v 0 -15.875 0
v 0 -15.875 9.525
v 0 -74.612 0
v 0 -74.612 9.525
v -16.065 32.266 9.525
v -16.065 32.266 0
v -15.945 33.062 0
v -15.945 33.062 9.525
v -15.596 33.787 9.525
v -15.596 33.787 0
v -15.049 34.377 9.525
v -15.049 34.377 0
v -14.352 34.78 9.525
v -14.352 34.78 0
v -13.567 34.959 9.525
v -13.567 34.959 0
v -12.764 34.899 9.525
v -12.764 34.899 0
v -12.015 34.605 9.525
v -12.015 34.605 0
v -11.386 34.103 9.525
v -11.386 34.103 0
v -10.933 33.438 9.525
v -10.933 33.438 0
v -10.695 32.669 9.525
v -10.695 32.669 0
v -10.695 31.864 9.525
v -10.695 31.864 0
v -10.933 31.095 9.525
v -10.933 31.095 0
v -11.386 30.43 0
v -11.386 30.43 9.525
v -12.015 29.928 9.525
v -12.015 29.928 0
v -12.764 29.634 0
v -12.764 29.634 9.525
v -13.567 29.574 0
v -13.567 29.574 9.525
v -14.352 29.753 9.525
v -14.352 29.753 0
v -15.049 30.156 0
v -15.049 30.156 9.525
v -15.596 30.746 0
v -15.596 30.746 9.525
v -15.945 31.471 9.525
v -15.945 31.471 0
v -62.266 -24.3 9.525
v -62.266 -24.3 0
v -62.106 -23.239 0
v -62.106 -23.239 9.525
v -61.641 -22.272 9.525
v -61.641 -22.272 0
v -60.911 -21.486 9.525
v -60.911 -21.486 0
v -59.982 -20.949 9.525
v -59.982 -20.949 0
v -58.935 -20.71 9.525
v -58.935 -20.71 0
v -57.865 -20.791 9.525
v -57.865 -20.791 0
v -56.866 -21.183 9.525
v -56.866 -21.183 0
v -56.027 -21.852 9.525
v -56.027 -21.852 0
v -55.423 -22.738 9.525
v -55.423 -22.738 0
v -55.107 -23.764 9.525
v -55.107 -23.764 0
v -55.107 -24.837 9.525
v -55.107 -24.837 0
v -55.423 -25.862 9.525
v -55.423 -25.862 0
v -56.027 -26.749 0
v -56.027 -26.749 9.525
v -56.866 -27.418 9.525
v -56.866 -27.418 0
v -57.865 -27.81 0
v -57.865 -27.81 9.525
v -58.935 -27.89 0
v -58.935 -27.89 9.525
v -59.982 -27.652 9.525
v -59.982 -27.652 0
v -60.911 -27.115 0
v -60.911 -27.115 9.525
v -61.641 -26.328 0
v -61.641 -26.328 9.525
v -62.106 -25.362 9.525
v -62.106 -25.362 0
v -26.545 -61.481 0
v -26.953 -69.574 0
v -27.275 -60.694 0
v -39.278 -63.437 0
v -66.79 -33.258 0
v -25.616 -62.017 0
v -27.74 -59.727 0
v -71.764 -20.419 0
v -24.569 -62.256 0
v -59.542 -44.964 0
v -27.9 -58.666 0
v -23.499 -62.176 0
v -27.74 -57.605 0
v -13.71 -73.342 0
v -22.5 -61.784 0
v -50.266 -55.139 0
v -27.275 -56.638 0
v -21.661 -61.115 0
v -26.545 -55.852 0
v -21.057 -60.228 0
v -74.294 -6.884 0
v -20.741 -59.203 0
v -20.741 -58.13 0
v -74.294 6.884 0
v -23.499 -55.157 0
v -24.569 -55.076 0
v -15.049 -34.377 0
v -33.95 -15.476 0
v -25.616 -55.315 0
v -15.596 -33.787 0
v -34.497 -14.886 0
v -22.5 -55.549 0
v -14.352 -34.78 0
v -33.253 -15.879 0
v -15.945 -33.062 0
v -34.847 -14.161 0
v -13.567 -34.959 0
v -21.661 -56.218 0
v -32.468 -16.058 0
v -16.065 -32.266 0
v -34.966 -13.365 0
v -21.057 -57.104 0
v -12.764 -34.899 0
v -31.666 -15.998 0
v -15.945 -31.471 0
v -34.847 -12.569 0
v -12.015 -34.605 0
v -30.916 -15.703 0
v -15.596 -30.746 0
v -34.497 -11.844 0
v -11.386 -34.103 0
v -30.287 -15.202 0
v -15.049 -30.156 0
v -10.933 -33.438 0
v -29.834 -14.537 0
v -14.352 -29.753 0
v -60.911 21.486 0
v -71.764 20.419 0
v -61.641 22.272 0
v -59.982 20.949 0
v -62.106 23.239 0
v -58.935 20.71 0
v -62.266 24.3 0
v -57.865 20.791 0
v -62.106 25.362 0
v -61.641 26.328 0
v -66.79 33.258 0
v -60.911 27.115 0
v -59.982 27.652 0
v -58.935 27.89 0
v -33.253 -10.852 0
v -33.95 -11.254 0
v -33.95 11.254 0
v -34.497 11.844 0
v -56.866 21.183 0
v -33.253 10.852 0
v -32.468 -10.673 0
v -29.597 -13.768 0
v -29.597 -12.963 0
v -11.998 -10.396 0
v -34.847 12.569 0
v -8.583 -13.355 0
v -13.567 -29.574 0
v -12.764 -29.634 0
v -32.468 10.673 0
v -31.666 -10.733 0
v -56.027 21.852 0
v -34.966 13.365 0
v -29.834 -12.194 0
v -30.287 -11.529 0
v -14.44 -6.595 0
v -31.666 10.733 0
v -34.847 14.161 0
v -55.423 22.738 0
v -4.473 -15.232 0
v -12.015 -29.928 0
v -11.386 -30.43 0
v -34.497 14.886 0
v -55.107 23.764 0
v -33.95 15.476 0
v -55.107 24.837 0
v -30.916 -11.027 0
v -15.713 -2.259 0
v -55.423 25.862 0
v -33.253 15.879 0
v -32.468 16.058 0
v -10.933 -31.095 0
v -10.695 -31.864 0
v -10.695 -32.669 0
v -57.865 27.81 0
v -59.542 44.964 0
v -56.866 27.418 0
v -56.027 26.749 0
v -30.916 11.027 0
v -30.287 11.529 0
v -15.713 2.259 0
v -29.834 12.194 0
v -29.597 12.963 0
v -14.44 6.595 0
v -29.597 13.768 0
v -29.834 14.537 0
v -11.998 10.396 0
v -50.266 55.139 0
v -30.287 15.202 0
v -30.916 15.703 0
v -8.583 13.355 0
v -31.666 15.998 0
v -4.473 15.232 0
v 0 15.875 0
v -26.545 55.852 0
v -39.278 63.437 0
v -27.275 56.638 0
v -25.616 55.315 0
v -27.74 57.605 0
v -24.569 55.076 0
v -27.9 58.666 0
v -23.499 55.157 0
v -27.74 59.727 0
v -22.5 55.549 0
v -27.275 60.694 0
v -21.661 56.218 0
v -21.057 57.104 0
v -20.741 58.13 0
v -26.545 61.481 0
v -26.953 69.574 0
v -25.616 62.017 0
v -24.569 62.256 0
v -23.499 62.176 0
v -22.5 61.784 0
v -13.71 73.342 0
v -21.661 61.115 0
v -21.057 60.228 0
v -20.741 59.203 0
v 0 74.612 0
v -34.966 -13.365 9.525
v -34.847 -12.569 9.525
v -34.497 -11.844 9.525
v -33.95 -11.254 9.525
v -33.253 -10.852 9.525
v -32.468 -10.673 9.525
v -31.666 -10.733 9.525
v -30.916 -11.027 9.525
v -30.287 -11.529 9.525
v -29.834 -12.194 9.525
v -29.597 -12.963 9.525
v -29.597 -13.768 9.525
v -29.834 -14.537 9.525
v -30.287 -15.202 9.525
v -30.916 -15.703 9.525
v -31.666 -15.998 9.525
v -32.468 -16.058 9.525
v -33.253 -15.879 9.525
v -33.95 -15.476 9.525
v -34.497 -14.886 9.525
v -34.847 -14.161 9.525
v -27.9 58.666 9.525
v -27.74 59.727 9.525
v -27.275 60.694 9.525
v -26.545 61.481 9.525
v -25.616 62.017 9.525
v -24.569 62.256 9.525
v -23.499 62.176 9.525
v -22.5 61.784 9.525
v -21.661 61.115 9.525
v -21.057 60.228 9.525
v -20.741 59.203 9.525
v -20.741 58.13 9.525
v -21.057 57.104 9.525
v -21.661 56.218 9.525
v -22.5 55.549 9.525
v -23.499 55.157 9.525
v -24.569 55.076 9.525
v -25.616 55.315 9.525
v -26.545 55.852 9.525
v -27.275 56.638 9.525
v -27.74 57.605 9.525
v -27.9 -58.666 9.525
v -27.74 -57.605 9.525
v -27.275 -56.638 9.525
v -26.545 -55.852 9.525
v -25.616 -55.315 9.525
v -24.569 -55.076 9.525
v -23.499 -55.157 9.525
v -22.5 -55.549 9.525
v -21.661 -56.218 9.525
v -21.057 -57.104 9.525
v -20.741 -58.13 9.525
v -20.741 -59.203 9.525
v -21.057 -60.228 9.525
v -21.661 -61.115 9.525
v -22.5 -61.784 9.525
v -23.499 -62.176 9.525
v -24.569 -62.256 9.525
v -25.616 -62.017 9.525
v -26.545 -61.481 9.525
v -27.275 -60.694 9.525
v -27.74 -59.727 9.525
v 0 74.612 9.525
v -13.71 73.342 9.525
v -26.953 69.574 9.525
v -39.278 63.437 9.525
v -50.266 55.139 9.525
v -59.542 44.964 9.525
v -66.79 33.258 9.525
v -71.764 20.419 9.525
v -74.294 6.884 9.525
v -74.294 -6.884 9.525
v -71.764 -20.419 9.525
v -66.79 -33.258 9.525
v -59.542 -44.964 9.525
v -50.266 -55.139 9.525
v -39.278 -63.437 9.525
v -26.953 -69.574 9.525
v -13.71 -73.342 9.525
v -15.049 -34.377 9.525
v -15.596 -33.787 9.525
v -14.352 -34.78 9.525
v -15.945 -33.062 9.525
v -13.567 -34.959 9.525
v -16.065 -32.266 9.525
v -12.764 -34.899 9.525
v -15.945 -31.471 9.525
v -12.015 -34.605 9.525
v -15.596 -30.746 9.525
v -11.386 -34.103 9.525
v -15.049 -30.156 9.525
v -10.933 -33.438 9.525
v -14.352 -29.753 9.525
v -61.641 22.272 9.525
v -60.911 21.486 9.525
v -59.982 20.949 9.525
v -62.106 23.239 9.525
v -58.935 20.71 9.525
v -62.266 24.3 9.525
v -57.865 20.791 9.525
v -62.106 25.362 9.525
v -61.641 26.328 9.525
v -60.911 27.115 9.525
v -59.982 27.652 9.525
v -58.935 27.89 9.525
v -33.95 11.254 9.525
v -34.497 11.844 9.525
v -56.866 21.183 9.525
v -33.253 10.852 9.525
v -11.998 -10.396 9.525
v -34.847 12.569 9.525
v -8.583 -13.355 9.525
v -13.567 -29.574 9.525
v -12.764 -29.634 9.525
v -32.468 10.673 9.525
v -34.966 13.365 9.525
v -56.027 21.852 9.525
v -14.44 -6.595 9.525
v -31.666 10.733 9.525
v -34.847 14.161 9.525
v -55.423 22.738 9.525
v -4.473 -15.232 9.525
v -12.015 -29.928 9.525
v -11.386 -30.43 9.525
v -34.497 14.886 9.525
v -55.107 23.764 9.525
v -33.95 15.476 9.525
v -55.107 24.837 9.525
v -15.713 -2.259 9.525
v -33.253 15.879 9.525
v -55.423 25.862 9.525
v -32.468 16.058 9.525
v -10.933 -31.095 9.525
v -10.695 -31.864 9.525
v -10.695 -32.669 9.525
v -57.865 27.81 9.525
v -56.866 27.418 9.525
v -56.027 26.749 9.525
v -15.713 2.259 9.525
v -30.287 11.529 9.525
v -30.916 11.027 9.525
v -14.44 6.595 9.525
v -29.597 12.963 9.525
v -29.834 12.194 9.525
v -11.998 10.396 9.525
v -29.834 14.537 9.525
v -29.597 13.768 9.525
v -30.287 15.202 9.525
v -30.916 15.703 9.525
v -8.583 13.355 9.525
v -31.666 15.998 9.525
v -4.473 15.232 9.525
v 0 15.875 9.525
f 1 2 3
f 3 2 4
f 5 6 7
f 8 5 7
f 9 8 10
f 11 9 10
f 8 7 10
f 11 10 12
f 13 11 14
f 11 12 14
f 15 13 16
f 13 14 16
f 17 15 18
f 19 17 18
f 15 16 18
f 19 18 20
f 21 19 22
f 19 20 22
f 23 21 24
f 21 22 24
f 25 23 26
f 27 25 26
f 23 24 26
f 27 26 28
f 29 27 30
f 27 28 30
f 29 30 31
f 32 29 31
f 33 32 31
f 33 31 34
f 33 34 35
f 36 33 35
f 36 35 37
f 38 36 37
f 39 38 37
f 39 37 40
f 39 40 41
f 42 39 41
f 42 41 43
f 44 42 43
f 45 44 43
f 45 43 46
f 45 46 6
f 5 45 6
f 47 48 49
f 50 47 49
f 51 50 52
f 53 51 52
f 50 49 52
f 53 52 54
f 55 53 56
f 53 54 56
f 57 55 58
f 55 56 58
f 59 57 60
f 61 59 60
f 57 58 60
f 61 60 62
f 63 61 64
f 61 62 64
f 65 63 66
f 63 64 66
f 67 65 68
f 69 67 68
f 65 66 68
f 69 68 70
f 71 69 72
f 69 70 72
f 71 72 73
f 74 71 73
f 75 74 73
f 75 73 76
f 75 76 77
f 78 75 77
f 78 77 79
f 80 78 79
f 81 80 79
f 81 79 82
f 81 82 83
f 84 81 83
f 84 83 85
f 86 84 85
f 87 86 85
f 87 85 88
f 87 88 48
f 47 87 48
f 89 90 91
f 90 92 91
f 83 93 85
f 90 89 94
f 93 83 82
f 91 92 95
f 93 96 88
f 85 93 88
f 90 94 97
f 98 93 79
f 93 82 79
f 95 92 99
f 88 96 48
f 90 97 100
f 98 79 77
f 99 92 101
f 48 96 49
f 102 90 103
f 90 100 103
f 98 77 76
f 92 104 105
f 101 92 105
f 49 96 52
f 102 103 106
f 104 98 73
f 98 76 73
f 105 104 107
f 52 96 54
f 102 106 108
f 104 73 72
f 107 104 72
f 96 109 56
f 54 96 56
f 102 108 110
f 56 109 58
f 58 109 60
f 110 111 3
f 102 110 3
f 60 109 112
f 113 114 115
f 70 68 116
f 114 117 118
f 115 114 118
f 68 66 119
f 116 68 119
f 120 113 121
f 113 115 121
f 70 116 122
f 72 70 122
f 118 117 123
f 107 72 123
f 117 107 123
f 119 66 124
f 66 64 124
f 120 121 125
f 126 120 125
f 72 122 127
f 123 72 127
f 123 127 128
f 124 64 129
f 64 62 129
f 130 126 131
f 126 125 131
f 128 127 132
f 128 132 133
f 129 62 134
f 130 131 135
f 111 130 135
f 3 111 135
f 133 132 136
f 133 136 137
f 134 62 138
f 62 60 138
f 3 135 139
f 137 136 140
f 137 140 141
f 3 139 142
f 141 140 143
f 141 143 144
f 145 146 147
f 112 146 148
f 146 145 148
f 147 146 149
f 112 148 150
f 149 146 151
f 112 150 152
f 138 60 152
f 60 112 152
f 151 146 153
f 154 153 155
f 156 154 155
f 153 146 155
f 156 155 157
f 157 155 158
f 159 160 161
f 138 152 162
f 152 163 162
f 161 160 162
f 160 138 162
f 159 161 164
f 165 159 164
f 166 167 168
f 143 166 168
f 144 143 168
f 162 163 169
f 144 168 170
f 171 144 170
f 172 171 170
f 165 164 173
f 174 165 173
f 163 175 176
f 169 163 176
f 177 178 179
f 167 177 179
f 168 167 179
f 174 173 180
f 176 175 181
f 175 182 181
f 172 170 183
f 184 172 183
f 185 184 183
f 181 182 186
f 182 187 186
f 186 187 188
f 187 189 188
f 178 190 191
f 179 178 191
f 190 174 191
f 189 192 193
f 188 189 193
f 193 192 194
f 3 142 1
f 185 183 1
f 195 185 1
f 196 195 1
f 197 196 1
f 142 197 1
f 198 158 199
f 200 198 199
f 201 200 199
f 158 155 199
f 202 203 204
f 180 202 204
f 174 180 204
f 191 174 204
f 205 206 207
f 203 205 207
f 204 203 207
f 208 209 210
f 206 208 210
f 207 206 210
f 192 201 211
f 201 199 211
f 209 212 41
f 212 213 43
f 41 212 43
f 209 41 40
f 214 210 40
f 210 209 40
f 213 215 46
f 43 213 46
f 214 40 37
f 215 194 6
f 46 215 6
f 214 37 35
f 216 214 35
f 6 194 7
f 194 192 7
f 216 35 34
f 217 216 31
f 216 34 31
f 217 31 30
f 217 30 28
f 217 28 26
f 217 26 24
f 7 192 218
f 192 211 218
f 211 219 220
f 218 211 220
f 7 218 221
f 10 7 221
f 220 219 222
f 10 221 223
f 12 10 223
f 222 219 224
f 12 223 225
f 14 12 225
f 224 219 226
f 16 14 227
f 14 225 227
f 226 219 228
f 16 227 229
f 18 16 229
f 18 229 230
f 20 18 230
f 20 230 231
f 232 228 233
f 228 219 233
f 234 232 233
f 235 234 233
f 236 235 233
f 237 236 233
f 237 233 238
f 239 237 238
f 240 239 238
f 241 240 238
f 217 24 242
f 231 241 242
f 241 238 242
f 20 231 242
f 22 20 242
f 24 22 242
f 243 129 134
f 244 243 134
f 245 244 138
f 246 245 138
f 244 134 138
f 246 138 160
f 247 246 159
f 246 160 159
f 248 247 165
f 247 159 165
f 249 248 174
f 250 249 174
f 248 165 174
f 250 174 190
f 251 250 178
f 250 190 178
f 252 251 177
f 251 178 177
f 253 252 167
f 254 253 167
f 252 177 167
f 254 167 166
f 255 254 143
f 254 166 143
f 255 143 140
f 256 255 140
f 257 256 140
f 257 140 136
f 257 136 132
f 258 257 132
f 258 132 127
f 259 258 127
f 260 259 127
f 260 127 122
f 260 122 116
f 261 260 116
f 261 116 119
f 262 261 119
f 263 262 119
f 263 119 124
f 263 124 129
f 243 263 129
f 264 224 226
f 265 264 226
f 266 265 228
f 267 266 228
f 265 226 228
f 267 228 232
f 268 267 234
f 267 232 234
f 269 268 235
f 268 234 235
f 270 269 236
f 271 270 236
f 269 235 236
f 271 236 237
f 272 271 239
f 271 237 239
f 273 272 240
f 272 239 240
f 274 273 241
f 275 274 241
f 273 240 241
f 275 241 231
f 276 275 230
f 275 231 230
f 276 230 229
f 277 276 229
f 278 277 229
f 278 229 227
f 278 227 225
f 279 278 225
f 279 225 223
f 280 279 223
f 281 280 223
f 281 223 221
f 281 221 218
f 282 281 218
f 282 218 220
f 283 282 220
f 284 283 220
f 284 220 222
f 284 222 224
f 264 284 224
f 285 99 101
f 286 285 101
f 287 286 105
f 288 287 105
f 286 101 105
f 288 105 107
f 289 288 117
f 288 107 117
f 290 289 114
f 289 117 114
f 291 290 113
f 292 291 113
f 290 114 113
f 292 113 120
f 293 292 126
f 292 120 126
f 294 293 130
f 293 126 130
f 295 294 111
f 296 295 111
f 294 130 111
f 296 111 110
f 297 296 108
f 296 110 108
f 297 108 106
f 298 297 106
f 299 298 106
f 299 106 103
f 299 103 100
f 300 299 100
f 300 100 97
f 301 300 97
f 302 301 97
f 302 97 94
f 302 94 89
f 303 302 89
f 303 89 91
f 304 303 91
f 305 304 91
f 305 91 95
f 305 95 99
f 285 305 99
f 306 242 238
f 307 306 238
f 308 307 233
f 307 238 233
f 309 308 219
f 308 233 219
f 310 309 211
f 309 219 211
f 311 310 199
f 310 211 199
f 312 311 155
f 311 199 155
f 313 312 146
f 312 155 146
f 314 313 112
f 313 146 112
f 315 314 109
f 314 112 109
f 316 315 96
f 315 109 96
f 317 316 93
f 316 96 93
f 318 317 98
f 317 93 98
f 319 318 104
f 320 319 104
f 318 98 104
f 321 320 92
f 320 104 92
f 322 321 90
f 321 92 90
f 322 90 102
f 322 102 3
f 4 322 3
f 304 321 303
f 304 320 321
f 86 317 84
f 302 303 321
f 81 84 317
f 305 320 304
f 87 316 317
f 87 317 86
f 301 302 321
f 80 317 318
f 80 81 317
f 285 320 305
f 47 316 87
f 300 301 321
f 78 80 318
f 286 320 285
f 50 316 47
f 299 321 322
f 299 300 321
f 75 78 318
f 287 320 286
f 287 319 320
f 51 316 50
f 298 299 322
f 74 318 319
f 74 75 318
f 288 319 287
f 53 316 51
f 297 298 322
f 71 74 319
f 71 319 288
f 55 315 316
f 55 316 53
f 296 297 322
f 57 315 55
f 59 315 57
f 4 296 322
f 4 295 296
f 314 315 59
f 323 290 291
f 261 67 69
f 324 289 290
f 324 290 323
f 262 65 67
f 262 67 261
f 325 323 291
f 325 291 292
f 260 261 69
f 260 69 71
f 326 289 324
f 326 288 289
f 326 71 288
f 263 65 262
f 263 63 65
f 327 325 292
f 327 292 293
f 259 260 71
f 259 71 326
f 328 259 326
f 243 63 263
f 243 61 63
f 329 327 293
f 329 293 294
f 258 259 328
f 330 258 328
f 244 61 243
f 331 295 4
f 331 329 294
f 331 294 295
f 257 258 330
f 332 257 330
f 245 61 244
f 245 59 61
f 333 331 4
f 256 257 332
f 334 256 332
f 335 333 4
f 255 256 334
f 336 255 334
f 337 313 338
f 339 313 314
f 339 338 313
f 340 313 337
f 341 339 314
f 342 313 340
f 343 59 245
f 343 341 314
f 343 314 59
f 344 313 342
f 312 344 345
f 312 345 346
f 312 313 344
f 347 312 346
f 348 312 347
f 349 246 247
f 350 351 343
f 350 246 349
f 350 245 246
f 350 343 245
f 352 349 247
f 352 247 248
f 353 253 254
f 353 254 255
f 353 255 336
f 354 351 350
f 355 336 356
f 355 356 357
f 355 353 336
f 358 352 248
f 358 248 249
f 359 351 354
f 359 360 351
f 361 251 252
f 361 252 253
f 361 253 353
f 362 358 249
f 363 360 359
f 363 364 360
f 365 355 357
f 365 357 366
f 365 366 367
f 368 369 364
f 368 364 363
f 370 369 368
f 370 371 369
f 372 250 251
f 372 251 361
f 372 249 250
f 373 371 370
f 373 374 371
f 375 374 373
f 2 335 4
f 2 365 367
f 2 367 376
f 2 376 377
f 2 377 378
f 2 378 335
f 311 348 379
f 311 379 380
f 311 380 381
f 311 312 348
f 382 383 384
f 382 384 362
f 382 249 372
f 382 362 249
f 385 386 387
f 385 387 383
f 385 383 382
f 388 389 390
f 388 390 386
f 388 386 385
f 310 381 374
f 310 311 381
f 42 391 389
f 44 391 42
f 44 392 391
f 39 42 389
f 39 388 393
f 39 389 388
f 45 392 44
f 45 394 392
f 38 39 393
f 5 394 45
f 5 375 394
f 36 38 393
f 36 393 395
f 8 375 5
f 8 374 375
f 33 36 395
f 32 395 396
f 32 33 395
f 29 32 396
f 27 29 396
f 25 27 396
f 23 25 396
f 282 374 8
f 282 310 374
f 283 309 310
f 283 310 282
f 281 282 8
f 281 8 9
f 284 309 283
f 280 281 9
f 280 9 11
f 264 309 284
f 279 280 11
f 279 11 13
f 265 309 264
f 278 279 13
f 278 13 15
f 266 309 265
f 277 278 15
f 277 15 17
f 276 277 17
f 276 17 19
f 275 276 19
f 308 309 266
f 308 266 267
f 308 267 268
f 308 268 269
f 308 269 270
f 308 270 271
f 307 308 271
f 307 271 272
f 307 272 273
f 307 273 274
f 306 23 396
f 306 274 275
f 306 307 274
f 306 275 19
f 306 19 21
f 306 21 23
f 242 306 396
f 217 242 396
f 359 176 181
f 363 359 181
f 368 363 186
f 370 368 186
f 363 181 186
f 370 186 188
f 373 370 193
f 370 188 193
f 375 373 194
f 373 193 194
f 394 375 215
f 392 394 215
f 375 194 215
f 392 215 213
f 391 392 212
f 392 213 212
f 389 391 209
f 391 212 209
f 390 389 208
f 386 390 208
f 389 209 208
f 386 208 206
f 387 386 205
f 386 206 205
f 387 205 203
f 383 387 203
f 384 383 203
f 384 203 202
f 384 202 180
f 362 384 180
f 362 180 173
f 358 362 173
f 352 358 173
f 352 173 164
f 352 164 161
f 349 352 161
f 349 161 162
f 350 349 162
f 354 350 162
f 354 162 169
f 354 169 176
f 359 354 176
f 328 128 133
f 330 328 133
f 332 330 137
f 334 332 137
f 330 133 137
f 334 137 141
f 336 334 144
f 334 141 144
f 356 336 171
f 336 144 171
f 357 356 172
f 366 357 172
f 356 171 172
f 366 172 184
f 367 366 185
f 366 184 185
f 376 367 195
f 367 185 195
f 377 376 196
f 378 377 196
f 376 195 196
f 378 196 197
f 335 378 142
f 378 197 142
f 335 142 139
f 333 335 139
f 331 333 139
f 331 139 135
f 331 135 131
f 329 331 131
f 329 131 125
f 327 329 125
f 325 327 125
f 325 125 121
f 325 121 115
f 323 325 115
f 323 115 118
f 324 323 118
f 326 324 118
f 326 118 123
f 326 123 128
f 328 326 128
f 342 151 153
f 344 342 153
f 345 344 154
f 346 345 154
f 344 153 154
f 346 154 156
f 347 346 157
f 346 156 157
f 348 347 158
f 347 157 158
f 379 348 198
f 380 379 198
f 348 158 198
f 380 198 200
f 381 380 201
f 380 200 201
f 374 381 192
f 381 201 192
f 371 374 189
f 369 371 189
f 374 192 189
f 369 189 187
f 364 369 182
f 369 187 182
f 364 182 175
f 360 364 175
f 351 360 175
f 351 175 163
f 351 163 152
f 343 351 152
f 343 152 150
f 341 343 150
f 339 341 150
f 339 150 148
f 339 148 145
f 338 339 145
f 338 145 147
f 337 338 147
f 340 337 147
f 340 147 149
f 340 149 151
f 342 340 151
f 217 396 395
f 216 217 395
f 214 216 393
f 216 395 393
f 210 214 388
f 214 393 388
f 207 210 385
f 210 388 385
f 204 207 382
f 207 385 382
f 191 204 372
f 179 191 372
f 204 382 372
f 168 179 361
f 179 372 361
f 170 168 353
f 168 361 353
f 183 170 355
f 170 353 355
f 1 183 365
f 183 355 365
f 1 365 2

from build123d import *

# Parameters (mm, degrees)
F0_R     = 74.6125
F1_DEPTH = 9.525
F2_R     = 15.875
F3_DEPTH = 9.526
F5_D     = 5.4
F6_R     = 2.7
F7_DEPTH = 9.526
F9_D     = 7.2


with BuildPart() as f1:
    # F0 (on Top) → F1 (new body)
    with BuildSketch(Plane.XY):
        Circle(F0_R)
    extrude(amount=F1_DEPTH)

    # F2 (on face) → F3 (cut, through all)
    with BuildSketch(Plane.XY.offset(9.525)):
        Circle(F2_R)
    extrude(amount=-F3_DEPTH, mode=Mode.SUBTRACT)

    # F5 (through all)
    with Locations(Plane.XY.offset(9.525)):
        with Locations((-13.3652133, 32.2664949823), (-32.2664903636, 13.3652244507), (-32.2664949823, -13.3652133), (-13.3652244507, -32.2664903636), (13.3652133, -32.2664949823), (32.2664903636, -13.3652244507), (32.2664949823, 13.3652133), (13.3652244507, 32.2664903636)):
            Hole(F5_D / 2)

    # F6 (on face) → F7 (cut, through all)
    with BuildSketch(Plane.XY.offset(9.525)):
        with BuildLine():
            Line((92.0014753938, 88.4870588779), (0, 88.4870588779))
            Line((0, 88.4870588779), (0, 74.6125))
            ThreePointArc((0, 74.6125), (52.7590047113, 52.7590047113), (74.6125, 0))
            ThreePointArc((74.6125, 0), (52.7590047113, -52.7590047113), (0, -74.6125))
            Line((0, -74.6125), (0, -93.3939293027))
            Line((0, -93.3939293027), (92.0014753938, -93.3939293027))
            Line((92.0014753938, -93.3939293027), (92.0014753938, 88.4870588779))
        make_face()
        with BuildLine():
            ThreePointArc((74.6125, 0), (52.7590047113, 52.7590047113), (0, 74.6125))
            Line((0, 74.6125), (0, 15.875))
            ThreePointArc((0, 15.875), (11.2253201513, 11.2253201513), (15.875, 0))
            ThreePointArc((15.875, 0), (11.2253201513, -11.2253201513), (0, -15.875))
            Line((0, -15.875), (0, -74.6125))
            ThreePointArc((0, -74.6125), (52.7590047113, -52.7590047113), (74.6125, 0))
        make_face()
        with Locations((13.3652133, -32.2664949823)):
            Circle(F6_R, mode=Mode.SUBTRACT)
        with Locations((32.2664903636, -13.3652244507)):
            Circle(F6_R, mode=Mode.SUBTRACT)
        with Locations((32.2664949823, 13.3652133)):
            Circle(F6_R, mode=Mode.SUBTRACT)
        with Locations((13.3652244507, 32.2664903636)):
            Circle(F6_R, mode=Mode.SUBTRACT)
    extrude(amount=-F7_DEPTH, mode=Mode.SUBTRACT)

    # F9 (through all)
    with Locations(Plane.XY.offset(9.525)):
        with Locations((-24.300392725, 58.6663524809), (-58.6663481481, 24.3004031854), (-58.6663524809, -24.300392725), (-24.3004031854, -58.6663481481)):
            Hole(F9_D / 2)


solid = f1.part
